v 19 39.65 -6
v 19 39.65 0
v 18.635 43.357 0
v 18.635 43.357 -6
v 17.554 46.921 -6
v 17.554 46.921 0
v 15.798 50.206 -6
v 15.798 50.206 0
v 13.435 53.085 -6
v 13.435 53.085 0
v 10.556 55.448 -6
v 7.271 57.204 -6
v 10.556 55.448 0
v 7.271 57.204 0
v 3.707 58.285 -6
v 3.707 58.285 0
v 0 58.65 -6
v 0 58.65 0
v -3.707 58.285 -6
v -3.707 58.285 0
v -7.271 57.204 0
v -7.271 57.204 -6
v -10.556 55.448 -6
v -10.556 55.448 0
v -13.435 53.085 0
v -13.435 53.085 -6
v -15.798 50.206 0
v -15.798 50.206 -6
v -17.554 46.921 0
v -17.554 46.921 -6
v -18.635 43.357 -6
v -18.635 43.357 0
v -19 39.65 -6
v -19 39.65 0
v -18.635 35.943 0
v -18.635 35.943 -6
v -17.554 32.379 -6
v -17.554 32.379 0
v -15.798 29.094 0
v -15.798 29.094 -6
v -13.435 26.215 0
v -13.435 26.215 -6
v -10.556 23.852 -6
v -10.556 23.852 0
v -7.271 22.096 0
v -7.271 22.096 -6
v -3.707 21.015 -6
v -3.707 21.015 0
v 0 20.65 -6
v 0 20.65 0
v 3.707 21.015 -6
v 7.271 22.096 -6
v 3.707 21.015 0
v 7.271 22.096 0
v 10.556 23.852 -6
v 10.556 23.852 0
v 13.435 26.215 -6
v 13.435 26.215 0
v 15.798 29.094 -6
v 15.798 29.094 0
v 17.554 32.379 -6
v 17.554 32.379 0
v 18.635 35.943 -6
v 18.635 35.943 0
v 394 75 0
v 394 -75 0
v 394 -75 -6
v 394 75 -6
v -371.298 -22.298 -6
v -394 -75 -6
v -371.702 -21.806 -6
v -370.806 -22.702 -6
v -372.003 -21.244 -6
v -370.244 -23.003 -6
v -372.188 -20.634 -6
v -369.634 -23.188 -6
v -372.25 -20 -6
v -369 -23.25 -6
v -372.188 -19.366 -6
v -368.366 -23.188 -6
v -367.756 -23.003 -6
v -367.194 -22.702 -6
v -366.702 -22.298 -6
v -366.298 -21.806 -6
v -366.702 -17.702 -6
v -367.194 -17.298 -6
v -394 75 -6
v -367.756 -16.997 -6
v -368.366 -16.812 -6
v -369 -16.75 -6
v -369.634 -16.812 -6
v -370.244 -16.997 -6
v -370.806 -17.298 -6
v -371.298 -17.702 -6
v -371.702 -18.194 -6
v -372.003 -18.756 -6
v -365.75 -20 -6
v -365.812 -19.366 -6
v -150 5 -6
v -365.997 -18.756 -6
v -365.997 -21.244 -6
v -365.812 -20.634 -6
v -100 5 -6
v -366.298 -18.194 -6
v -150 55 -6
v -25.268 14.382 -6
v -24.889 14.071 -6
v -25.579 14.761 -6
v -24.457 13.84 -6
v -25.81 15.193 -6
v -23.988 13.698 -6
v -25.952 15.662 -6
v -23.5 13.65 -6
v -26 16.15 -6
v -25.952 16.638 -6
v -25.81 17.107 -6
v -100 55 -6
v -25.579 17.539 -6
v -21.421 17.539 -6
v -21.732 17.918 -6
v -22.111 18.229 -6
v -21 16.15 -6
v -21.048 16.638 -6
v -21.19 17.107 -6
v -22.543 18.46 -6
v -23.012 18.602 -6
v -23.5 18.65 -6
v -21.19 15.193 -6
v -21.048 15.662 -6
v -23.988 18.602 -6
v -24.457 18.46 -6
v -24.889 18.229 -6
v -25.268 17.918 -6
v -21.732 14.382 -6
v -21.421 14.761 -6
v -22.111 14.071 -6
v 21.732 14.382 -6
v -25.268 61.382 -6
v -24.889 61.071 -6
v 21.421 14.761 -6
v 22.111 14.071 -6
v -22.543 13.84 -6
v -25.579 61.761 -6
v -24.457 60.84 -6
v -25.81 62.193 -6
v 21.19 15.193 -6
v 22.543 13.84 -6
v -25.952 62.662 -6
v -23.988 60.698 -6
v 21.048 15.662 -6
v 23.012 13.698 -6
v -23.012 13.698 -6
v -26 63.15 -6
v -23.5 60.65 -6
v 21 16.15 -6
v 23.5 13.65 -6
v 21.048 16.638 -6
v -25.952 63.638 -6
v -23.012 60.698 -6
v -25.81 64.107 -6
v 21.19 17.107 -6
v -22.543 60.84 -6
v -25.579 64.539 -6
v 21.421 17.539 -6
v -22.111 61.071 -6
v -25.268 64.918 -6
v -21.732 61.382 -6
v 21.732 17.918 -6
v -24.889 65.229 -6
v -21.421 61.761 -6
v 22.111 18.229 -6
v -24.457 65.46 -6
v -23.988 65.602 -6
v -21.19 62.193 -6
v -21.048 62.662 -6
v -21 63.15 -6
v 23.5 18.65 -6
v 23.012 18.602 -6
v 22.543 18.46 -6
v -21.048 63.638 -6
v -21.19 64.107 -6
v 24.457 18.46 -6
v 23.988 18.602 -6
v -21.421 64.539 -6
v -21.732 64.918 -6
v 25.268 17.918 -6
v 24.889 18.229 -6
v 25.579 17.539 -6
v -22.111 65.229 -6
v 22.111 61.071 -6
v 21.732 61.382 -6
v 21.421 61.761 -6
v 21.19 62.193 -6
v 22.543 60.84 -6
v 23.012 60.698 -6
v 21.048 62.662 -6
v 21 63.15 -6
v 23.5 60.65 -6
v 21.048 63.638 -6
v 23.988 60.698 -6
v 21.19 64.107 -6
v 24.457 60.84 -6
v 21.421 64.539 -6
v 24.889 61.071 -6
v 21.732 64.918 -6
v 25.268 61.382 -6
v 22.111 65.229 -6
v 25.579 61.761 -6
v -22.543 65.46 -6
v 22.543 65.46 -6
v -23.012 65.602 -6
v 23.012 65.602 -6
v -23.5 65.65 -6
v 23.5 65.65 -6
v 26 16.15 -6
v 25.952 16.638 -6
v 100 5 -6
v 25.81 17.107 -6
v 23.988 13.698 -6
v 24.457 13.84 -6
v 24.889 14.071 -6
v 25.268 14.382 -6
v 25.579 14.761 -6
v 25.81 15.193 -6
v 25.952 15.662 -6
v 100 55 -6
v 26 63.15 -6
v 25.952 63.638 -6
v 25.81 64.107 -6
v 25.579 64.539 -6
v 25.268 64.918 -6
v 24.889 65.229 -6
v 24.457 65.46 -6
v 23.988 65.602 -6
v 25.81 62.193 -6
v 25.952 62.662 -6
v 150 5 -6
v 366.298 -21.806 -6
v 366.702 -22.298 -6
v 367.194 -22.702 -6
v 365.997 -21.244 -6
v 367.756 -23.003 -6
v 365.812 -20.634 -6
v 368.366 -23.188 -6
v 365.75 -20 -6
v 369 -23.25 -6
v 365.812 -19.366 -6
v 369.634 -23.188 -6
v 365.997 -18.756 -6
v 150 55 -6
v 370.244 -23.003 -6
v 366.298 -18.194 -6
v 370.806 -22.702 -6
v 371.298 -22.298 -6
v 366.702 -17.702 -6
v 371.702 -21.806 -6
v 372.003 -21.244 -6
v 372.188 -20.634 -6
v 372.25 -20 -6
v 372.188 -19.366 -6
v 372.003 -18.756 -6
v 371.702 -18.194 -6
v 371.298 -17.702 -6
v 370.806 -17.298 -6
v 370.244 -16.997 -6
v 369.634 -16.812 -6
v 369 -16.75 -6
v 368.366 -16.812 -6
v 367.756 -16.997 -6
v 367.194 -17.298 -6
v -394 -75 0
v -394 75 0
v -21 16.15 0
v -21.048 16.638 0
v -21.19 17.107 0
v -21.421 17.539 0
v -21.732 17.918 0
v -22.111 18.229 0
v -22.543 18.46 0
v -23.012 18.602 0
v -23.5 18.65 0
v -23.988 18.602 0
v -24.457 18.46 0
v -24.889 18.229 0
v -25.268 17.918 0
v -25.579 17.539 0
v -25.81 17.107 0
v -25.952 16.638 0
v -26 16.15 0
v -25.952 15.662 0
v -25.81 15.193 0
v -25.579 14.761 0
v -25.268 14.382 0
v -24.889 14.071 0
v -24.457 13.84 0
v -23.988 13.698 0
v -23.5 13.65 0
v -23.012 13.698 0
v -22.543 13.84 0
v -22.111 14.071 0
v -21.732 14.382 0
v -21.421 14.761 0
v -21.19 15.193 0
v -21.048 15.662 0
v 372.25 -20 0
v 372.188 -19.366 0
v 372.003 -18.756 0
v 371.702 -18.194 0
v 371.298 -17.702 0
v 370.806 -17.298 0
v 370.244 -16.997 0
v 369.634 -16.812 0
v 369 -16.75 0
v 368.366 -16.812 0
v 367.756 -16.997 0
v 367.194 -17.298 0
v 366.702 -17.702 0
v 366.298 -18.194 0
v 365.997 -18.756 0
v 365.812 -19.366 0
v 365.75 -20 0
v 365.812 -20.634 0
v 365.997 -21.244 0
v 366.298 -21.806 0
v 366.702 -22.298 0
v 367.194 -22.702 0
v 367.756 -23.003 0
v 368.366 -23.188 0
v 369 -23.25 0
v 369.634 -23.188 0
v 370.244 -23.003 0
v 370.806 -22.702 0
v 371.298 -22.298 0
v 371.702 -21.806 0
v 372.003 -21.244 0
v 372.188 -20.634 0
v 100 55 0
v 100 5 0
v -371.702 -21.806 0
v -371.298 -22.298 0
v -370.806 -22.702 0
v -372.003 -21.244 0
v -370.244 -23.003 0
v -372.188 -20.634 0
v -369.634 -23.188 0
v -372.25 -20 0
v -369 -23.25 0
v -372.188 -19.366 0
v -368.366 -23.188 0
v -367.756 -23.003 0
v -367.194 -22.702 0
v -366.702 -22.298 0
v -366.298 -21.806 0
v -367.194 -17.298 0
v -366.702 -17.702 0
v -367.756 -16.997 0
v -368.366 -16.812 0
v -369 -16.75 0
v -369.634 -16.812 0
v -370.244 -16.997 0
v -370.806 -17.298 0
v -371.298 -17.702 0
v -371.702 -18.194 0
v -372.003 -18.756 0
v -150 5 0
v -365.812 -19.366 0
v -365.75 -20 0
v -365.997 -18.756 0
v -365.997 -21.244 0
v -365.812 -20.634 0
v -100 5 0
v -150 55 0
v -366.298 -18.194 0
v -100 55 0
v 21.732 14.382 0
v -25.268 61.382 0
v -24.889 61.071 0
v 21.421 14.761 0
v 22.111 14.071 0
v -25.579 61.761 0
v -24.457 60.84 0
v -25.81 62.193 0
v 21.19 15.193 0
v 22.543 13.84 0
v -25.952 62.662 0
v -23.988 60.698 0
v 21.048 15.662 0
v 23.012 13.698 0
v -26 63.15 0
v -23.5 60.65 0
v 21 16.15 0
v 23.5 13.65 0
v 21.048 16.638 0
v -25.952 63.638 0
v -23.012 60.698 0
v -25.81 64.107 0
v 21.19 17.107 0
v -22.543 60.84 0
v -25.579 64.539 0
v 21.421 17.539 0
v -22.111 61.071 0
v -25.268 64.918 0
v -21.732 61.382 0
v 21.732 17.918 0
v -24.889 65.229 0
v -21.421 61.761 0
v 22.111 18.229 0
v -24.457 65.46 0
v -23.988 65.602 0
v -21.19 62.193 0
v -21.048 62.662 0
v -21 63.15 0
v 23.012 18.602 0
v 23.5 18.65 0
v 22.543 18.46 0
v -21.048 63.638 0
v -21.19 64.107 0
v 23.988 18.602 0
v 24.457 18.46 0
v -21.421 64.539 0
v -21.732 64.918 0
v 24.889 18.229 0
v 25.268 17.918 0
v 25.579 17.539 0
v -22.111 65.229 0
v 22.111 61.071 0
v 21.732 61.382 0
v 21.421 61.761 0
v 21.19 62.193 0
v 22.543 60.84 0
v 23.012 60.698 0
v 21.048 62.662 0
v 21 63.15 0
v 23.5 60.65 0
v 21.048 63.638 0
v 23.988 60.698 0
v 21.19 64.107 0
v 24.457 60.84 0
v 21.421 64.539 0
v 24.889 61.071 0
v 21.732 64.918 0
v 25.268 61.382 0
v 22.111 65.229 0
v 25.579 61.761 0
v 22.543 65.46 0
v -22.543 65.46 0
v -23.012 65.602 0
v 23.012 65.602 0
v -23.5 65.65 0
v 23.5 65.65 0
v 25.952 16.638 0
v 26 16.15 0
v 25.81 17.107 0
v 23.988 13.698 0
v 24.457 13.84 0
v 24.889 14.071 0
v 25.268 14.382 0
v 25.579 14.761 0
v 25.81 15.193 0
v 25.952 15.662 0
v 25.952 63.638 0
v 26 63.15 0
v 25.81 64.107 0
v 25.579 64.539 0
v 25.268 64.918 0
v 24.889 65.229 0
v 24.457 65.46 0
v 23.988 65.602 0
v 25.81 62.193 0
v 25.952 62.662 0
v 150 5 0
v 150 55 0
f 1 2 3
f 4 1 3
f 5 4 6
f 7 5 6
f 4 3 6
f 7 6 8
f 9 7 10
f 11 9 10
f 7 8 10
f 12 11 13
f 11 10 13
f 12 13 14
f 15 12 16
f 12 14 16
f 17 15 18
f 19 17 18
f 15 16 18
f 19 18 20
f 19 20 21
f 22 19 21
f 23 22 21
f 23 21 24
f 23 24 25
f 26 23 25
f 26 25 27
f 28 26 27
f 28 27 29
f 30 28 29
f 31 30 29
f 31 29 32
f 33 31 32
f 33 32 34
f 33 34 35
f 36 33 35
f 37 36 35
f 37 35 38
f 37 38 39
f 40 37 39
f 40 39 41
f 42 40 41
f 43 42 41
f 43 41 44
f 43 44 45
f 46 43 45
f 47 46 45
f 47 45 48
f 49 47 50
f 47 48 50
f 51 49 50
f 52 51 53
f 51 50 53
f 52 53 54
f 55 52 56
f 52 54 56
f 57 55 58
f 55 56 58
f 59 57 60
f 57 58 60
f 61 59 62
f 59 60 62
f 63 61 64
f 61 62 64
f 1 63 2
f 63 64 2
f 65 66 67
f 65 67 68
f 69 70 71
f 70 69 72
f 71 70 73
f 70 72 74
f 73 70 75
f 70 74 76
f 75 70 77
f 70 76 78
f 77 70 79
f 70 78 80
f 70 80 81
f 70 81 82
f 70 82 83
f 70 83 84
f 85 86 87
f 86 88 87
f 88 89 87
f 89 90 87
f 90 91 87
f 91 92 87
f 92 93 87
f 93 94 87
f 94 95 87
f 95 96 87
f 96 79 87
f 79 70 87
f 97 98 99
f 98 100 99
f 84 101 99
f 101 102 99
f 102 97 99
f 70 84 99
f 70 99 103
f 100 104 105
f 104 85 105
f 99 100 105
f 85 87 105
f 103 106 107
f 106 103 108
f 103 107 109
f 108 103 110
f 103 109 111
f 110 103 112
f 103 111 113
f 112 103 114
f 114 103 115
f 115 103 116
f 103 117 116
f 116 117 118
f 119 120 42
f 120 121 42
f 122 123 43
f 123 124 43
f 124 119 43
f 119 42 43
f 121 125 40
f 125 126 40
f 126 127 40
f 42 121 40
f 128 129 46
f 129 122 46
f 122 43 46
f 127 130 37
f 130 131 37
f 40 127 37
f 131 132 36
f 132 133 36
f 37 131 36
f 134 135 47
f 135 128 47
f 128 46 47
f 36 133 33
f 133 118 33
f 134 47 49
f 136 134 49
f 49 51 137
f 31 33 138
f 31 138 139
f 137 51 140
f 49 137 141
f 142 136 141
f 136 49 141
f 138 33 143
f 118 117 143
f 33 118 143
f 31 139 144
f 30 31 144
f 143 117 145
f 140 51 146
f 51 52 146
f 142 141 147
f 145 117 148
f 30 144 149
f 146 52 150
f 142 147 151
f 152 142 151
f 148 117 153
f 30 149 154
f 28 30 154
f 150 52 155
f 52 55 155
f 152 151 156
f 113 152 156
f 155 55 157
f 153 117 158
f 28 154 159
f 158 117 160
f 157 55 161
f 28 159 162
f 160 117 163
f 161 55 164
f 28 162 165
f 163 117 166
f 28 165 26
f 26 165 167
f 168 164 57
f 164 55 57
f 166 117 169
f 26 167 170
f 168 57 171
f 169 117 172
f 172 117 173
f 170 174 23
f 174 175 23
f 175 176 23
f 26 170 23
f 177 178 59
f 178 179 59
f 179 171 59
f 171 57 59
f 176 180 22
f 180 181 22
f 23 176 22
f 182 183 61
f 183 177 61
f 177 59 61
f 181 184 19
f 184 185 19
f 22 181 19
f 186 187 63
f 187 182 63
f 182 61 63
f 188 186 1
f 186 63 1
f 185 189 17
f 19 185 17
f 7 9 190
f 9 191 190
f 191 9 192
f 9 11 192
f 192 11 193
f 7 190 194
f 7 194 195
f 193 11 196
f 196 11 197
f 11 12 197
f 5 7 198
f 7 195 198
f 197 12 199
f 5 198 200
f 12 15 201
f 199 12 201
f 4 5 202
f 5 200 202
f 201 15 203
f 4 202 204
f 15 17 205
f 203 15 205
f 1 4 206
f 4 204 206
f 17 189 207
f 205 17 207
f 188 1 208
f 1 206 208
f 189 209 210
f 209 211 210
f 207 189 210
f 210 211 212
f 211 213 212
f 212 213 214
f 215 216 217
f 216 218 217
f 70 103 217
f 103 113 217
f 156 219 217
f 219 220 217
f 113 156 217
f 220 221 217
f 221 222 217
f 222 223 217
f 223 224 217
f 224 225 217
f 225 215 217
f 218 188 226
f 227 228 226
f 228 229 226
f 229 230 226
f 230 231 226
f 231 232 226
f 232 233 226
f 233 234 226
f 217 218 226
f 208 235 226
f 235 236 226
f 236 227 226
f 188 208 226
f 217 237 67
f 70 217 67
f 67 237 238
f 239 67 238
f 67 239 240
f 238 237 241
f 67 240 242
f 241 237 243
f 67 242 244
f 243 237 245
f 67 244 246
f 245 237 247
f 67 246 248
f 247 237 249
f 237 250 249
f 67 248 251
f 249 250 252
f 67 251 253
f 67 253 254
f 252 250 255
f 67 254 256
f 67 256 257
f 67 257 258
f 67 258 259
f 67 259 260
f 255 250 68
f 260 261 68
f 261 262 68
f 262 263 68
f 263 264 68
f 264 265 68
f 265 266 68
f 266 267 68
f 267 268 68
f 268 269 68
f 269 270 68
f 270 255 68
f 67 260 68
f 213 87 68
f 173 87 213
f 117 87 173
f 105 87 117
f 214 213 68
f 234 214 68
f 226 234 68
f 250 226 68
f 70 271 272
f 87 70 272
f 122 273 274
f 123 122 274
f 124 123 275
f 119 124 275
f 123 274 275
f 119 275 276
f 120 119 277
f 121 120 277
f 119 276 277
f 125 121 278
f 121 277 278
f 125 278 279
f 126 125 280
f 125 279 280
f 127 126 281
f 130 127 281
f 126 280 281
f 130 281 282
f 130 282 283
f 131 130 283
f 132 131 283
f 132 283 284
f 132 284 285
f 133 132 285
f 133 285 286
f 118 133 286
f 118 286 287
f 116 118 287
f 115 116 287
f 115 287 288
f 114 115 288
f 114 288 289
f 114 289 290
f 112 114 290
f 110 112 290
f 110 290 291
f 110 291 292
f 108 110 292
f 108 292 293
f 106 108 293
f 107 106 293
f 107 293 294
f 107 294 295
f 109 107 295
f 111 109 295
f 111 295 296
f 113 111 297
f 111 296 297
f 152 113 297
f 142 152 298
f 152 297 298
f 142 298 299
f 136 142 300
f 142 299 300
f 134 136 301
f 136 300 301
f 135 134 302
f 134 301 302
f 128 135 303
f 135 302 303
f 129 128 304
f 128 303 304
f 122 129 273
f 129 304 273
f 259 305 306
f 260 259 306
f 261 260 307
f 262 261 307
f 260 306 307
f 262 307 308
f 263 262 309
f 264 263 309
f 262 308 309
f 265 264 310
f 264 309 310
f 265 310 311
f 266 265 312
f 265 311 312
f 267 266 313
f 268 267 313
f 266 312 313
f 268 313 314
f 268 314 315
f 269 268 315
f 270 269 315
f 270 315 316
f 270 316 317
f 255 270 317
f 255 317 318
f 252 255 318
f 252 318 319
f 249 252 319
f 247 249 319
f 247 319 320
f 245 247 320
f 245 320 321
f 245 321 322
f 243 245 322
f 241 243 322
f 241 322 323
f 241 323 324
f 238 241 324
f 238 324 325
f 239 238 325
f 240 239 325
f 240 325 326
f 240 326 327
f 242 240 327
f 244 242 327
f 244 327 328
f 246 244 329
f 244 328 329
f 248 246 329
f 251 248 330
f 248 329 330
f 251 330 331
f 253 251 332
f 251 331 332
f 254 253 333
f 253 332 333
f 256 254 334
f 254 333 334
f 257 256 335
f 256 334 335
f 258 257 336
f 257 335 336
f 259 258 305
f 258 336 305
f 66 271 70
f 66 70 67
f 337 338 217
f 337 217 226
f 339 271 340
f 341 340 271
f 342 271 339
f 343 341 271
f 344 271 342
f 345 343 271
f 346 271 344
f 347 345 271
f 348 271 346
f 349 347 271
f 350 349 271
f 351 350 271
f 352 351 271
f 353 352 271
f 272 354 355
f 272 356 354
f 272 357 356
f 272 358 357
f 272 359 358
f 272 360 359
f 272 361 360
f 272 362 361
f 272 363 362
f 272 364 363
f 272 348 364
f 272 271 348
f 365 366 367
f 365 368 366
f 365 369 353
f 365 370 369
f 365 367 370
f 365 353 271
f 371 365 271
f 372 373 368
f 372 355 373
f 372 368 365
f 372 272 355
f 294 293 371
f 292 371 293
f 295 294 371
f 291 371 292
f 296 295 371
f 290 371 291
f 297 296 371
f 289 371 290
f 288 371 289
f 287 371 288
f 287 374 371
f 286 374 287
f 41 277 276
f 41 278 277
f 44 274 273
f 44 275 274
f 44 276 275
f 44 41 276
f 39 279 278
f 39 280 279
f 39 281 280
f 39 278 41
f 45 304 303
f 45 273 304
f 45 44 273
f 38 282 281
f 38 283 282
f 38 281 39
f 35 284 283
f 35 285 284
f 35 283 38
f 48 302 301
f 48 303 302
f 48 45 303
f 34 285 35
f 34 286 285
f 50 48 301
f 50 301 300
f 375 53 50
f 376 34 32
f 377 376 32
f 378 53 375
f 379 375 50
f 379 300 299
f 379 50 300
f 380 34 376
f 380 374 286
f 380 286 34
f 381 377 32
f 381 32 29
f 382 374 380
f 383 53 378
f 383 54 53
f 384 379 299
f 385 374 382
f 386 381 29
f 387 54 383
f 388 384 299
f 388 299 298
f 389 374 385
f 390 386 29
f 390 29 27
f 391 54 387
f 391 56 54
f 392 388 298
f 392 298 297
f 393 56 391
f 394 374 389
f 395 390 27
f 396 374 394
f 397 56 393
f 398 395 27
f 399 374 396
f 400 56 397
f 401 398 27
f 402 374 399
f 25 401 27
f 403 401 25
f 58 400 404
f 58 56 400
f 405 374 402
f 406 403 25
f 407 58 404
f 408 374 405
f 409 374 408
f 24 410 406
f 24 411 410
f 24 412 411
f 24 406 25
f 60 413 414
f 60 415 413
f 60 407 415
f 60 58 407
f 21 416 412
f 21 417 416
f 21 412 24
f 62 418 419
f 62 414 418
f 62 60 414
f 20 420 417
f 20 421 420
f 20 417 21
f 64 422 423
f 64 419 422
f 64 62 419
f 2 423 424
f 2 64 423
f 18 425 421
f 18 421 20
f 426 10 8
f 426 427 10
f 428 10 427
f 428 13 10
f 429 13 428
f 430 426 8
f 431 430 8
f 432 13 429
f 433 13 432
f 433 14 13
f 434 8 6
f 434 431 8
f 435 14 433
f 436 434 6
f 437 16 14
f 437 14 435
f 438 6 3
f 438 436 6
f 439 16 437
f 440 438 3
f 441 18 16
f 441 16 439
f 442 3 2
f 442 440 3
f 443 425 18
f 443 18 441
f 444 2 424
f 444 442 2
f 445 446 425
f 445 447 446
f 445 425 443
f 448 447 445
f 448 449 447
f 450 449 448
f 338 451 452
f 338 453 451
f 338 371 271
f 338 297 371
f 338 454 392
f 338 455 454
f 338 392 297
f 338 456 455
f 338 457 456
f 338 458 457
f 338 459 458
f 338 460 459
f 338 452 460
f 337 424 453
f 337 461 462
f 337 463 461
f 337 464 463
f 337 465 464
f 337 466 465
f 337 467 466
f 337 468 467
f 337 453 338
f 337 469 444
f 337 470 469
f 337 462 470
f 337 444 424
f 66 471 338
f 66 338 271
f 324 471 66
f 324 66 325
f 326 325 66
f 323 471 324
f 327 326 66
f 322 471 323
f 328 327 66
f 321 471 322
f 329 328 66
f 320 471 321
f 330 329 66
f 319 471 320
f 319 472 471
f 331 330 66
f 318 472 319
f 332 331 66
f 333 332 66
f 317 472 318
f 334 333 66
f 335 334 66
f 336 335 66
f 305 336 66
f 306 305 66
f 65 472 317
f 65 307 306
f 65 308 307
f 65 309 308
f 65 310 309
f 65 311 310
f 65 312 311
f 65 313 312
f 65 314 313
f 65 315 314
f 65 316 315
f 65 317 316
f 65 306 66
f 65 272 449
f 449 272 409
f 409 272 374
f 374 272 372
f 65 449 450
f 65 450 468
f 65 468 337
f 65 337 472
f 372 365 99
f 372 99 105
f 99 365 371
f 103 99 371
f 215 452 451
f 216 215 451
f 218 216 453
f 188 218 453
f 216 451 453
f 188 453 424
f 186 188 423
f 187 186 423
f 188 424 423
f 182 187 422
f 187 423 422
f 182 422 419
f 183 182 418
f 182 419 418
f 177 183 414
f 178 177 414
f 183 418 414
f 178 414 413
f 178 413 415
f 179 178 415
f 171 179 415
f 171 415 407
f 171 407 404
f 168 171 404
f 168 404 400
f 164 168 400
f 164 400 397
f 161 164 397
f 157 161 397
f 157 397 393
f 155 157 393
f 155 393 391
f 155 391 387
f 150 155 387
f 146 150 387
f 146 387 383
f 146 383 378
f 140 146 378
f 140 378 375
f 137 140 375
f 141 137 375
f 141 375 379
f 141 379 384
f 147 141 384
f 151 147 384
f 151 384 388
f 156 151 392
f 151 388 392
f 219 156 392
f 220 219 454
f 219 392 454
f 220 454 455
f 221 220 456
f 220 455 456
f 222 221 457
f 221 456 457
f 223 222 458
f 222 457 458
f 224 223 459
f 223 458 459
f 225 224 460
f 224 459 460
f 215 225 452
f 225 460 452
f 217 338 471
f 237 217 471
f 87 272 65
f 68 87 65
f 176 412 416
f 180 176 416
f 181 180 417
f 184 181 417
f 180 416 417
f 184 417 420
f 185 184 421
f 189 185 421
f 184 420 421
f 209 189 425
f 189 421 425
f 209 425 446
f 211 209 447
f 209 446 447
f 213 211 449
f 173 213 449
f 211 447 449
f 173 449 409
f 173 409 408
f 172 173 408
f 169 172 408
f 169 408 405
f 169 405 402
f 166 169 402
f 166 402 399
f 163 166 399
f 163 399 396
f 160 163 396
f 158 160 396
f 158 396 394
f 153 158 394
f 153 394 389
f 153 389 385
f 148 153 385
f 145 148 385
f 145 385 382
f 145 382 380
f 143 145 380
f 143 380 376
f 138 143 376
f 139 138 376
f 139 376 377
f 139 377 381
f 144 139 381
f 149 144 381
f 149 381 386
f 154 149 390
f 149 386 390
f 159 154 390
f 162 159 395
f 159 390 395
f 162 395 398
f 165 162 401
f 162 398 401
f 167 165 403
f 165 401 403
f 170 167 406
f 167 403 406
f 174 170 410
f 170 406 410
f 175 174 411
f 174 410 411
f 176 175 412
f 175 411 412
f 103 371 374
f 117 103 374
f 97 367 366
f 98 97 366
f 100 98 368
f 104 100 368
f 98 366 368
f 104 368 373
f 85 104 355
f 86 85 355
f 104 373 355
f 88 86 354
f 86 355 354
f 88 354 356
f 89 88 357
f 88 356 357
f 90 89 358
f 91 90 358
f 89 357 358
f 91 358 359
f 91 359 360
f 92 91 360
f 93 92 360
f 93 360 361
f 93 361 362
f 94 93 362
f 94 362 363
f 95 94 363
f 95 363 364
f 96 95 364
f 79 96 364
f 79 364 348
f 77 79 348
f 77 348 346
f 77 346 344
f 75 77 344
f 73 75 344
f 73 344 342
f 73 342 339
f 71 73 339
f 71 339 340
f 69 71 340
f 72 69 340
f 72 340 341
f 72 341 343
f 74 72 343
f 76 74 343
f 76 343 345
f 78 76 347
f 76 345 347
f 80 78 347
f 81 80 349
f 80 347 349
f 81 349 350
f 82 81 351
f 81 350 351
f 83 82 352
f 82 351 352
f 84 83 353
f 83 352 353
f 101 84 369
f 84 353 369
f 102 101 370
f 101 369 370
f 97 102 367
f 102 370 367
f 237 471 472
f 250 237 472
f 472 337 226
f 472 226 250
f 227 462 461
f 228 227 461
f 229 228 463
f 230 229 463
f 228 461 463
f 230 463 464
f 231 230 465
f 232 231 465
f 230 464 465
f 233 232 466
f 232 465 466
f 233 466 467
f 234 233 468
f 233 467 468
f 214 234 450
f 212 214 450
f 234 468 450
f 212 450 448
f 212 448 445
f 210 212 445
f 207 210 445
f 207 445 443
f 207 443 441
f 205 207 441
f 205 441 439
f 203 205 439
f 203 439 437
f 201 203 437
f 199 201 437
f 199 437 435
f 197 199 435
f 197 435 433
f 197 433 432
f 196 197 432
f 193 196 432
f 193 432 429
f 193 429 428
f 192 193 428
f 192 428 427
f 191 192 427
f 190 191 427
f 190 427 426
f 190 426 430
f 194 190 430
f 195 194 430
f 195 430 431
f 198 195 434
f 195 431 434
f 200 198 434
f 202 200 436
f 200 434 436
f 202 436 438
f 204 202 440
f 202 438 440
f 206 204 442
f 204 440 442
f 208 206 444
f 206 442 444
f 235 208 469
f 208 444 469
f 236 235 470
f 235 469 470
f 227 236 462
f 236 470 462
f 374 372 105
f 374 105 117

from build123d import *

# Parameters (mm, degrees)
SKETCH1_W          = 788
SKETCH1_H          = 150
BASE_FLANGE1_DEPTH = 6
SKETCH2_W          = 50
SKETCH2_H          = 50
CUT_EXTRUDE1_DEPTH = 402.119682888
SKETCH3_R          = 19
SKETCH3_R_2        = 2.5
CUT_EXTRUDE2_DEPTH = 10
SKETCH4_R          = 3.25
CUT_EXTRUDE3_DEPTH = 10


# Sheet-metal steps are written as plain solids
with BuildPart() as part:
    # Sketch1 → Base-Flange1 (new body)
    with BuildSketch(Plane.XY):
        Rectangle(SKETCH1_W, SKETCH1_H)
    extrude(amount=-BASE_FLANGE1_DEPTH)

    # Sketch2 → Cut-Extrude1 (cut, through all)
    with BuildSketch(Plane.XY):
        with Locations((-125, 30)):
            Rectangle(SKETCH2_W, SKETCH2_H)
        with Locations((125, 30)):
            Rectangle(SKETCH2_W, SKETCH2_H)
    extrude(amount=-CUT_EXTRUDE1_DEPTH, mode=Mode.SUBTRACT)

    # Sketch3 → Cut-Extrude2 (cut)
    with BuildSketch(Plane.XY):
        with Locations((0, 39.65)):
            Circle(SKETCH3_R)
        with Locations((23.5, 63.15)):
            Circle(SKETCH3_R_2)
        with Locations((23.5, 16.15)):
            Circle(SKETCH3_R_2)
        with Locations((-23.5, 16.15)):
            Circle(SKETCH3_R_2)
        with Locations((-23.5, 63.15)):
            Circle(SKETCH3_R_2)
    extrude(amount=-CUT_EXTRUDE2_DEPTH, mode=Mode.SUBTRACT)

    # Sketch4 → Cut-Extrude3 (cut)
    with BuildSketch(Plane.XY):
        with Locations((369, -20)):
            Circle(SKETCH4_R)
        with Locations((-369, -20)):
            Circle(SKETCH4_R)
    extrude(amount=-CUT_EXTRUDE3_DEPTH, mode=Mode.SUBTRACT)


solid = part.part
